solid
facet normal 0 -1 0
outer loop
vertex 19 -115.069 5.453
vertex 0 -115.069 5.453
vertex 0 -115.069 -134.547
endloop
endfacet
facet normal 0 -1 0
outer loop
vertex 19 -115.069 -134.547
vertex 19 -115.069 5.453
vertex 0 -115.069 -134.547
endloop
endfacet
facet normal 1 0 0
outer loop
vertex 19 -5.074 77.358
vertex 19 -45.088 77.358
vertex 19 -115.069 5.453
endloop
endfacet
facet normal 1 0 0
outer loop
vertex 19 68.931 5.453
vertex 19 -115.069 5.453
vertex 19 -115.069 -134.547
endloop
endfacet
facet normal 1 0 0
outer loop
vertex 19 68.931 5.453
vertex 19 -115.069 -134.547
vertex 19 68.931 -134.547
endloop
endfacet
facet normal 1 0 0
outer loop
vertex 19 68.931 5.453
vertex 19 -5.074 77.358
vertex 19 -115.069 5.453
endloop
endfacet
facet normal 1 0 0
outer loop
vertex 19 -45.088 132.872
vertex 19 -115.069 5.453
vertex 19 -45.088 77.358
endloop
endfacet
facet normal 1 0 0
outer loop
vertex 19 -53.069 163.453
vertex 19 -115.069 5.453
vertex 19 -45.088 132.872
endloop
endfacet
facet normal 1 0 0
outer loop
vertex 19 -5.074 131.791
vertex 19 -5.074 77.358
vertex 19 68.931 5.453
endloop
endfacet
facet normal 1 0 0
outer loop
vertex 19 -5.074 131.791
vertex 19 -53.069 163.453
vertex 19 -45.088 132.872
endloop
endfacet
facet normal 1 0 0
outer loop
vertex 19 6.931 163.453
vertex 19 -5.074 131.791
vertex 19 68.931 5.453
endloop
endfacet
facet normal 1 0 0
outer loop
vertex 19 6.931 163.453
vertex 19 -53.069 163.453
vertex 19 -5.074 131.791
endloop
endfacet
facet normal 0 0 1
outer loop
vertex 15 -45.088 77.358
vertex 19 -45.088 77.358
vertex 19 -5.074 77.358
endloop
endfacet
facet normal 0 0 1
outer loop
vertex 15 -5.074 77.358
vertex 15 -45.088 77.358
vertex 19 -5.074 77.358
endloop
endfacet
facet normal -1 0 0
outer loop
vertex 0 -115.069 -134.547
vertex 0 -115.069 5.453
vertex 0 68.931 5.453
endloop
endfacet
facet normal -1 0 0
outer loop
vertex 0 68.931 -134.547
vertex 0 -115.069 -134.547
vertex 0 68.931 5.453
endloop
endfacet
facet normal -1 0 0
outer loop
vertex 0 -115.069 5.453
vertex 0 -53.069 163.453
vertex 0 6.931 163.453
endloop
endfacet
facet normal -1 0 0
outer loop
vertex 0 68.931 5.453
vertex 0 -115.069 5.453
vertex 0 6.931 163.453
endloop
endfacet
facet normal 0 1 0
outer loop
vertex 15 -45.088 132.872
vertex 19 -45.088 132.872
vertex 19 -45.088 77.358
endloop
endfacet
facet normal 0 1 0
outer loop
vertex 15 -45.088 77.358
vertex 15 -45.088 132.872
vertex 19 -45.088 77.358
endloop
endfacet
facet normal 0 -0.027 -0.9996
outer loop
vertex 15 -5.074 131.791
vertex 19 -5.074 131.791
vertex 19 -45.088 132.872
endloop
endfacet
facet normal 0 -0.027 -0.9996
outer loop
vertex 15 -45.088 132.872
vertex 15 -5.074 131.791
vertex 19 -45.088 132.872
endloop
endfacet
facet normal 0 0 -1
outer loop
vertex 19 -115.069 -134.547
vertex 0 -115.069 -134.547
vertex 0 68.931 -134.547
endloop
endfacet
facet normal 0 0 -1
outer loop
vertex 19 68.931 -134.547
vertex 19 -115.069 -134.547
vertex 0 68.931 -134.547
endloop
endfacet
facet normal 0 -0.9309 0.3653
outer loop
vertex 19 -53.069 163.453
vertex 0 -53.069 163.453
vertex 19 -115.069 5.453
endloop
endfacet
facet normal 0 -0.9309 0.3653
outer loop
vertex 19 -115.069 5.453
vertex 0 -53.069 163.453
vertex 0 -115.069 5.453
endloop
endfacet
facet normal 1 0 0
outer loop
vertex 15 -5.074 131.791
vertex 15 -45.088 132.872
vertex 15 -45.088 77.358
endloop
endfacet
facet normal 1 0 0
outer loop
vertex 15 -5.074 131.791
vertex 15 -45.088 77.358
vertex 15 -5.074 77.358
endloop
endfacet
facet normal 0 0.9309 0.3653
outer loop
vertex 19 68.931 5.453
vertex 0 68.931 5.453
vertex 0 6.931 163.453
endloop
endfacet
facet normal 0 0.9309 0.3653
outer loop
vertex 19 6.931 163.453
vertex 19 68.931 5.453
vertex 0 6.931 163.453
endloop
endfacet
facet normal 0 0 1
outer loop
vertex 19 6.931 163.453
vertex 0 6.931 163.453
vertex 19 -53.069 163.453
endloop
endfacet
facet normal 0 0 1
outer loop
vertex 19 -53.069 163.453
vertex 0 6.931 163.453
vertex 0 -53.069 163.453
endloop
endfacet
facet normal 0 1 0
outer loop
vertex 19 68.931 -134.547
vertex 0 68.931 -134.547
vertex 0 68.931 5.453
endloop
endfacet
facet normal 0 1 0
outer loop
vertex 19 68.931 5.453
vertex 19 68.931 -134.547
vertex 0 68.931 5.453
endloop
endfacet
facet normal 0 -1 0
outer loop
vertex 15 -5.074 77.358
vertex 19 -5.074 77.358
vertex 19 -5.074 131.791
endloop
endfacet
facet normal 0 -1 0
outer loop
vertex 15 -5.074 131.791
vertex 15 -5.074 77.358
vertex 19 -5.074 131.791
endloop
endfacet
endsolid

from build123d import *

# Parameters (mm, degrees)
F1_DEPTH = 19
F3_DEPTH = 4


with BuildPart() as f1:
    # F0 (on Right) → F1 (new body)
    with BuildSketch(Plane.YZ):
        Polygon((6.931424, 163.453436), (-53.068576, 163.453436), (-115.068576, 5.453436), (-115.068576, -134.546564), (68.931424, -134.546564), (68.931424, 5.453436), align=None)
    extrude(amount=F1_DEPTH)

    # F2 (on face) → F3 (cut)
    with BuildSketch(Plane.YZ.offset(19)):
        Polygon((-5.074208, 131.790936), (-45.087915, 132.872388), (-45.087915, 77.357873), (-5.074208, 77.357873), align=None)
    extrude(amount=-F3_DEPTH, mode=Mode.SUBTRACT)


solid = f1.part
